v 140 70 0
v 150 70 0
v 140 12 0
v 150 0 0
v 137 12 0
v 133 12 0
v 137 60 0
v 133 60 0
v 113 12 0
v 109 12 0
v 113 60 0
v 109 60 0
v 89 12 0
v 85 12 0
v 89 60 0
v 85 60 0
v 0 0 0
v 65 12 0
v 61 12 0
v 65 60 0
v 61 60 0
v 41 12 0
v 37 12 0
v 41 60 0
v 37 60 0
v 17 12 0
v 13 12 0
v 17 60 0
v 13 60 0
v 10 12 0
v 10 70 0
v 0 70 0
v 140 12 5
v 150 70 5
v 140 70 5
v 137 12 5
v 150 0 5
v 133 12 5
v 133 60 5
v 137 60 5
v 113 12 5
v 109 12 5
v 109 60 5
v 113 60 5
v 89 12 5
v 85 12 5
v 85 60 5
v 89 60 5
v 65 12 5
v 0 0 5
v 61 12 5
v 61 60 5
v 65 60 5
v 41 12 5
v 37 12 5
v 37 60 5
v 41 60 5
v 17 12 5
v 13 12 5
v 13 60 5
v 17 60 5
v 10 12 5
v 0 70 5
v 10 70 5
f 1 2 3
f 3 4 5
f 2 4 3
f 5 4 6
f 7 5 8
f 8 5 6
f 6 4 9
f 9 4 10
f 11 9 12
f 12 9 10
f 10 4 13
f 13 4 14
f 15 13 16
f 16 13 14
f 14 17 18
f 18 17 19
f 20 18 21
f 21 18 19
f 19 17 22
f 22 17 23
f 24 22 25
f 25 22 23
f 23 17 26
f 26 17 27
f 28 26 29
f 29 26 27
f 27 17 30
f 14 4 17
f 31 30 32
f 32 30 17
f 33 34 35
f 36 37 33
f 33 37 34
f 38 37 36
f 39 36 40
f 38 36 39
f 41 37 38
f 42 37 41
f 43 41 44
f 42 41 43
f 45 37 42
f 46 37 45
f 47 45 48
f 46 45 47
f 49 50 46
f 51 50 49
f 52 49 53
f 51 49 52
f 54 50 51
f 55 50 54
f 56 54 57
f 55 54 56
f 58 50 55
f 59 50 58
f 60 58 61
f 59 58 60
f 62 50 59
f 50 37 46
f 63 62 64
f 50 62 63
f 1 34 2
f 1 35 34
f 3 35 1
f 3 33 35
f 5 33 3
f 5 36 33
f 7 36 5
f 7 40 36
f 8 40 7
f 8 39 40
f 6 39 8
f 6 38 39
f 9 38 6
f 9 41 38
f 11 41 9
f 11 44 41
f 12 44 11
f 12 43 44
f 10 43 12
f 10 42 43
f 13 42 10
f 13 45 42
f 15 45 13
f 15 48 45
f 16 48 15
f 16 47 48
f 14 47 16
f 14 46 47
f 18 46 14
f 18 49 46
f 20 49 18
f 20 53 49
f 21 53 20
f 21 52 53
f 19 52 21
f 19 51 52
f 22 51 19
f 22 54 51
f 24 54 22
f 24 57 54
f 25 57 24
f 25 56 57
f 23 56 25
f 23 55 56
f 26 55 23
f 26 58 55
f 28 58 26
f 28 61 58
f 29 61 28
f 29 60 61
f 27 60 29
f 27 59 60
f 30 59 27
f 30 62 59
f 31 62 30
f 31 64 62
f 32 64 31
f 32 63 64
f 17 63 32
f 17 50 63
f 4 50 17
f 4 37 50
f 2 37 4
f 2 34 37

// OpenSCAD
$fn = 32;

// ----------------------------------------------------------------------
// Guard grille: 6 slats over a 150 x 70 mm plate
// ----------------------------------------------------------------------

// --- parameters (mm) ---
profile_height = 5;       // extrusion height
profile_points = 32;      // points of the closed outline

profile = [[0, 0], [150, 0], [150, 70], [140, 70], [140, 12], [137, 12], [137, 60], [133, 60], [133, 12], [113, 12], [113, 60], [109, 60], [109, 12], [89, 12], [89, 60], [85, 60], [85, 12], [65, 12], [65, 60], [61, 60], [61, 12], [41, 12], [41, 60], [37, 60], [37, 12], [17, 12], [17, 60], [13, 60], [13, 12], [10, 12], [10, 70], [0, 70]];  // single closed polygon, 32 points, counter clockwise

// --- the one profile operation ---
linear_extrude(height = profile_height) polygon(points = profile);
